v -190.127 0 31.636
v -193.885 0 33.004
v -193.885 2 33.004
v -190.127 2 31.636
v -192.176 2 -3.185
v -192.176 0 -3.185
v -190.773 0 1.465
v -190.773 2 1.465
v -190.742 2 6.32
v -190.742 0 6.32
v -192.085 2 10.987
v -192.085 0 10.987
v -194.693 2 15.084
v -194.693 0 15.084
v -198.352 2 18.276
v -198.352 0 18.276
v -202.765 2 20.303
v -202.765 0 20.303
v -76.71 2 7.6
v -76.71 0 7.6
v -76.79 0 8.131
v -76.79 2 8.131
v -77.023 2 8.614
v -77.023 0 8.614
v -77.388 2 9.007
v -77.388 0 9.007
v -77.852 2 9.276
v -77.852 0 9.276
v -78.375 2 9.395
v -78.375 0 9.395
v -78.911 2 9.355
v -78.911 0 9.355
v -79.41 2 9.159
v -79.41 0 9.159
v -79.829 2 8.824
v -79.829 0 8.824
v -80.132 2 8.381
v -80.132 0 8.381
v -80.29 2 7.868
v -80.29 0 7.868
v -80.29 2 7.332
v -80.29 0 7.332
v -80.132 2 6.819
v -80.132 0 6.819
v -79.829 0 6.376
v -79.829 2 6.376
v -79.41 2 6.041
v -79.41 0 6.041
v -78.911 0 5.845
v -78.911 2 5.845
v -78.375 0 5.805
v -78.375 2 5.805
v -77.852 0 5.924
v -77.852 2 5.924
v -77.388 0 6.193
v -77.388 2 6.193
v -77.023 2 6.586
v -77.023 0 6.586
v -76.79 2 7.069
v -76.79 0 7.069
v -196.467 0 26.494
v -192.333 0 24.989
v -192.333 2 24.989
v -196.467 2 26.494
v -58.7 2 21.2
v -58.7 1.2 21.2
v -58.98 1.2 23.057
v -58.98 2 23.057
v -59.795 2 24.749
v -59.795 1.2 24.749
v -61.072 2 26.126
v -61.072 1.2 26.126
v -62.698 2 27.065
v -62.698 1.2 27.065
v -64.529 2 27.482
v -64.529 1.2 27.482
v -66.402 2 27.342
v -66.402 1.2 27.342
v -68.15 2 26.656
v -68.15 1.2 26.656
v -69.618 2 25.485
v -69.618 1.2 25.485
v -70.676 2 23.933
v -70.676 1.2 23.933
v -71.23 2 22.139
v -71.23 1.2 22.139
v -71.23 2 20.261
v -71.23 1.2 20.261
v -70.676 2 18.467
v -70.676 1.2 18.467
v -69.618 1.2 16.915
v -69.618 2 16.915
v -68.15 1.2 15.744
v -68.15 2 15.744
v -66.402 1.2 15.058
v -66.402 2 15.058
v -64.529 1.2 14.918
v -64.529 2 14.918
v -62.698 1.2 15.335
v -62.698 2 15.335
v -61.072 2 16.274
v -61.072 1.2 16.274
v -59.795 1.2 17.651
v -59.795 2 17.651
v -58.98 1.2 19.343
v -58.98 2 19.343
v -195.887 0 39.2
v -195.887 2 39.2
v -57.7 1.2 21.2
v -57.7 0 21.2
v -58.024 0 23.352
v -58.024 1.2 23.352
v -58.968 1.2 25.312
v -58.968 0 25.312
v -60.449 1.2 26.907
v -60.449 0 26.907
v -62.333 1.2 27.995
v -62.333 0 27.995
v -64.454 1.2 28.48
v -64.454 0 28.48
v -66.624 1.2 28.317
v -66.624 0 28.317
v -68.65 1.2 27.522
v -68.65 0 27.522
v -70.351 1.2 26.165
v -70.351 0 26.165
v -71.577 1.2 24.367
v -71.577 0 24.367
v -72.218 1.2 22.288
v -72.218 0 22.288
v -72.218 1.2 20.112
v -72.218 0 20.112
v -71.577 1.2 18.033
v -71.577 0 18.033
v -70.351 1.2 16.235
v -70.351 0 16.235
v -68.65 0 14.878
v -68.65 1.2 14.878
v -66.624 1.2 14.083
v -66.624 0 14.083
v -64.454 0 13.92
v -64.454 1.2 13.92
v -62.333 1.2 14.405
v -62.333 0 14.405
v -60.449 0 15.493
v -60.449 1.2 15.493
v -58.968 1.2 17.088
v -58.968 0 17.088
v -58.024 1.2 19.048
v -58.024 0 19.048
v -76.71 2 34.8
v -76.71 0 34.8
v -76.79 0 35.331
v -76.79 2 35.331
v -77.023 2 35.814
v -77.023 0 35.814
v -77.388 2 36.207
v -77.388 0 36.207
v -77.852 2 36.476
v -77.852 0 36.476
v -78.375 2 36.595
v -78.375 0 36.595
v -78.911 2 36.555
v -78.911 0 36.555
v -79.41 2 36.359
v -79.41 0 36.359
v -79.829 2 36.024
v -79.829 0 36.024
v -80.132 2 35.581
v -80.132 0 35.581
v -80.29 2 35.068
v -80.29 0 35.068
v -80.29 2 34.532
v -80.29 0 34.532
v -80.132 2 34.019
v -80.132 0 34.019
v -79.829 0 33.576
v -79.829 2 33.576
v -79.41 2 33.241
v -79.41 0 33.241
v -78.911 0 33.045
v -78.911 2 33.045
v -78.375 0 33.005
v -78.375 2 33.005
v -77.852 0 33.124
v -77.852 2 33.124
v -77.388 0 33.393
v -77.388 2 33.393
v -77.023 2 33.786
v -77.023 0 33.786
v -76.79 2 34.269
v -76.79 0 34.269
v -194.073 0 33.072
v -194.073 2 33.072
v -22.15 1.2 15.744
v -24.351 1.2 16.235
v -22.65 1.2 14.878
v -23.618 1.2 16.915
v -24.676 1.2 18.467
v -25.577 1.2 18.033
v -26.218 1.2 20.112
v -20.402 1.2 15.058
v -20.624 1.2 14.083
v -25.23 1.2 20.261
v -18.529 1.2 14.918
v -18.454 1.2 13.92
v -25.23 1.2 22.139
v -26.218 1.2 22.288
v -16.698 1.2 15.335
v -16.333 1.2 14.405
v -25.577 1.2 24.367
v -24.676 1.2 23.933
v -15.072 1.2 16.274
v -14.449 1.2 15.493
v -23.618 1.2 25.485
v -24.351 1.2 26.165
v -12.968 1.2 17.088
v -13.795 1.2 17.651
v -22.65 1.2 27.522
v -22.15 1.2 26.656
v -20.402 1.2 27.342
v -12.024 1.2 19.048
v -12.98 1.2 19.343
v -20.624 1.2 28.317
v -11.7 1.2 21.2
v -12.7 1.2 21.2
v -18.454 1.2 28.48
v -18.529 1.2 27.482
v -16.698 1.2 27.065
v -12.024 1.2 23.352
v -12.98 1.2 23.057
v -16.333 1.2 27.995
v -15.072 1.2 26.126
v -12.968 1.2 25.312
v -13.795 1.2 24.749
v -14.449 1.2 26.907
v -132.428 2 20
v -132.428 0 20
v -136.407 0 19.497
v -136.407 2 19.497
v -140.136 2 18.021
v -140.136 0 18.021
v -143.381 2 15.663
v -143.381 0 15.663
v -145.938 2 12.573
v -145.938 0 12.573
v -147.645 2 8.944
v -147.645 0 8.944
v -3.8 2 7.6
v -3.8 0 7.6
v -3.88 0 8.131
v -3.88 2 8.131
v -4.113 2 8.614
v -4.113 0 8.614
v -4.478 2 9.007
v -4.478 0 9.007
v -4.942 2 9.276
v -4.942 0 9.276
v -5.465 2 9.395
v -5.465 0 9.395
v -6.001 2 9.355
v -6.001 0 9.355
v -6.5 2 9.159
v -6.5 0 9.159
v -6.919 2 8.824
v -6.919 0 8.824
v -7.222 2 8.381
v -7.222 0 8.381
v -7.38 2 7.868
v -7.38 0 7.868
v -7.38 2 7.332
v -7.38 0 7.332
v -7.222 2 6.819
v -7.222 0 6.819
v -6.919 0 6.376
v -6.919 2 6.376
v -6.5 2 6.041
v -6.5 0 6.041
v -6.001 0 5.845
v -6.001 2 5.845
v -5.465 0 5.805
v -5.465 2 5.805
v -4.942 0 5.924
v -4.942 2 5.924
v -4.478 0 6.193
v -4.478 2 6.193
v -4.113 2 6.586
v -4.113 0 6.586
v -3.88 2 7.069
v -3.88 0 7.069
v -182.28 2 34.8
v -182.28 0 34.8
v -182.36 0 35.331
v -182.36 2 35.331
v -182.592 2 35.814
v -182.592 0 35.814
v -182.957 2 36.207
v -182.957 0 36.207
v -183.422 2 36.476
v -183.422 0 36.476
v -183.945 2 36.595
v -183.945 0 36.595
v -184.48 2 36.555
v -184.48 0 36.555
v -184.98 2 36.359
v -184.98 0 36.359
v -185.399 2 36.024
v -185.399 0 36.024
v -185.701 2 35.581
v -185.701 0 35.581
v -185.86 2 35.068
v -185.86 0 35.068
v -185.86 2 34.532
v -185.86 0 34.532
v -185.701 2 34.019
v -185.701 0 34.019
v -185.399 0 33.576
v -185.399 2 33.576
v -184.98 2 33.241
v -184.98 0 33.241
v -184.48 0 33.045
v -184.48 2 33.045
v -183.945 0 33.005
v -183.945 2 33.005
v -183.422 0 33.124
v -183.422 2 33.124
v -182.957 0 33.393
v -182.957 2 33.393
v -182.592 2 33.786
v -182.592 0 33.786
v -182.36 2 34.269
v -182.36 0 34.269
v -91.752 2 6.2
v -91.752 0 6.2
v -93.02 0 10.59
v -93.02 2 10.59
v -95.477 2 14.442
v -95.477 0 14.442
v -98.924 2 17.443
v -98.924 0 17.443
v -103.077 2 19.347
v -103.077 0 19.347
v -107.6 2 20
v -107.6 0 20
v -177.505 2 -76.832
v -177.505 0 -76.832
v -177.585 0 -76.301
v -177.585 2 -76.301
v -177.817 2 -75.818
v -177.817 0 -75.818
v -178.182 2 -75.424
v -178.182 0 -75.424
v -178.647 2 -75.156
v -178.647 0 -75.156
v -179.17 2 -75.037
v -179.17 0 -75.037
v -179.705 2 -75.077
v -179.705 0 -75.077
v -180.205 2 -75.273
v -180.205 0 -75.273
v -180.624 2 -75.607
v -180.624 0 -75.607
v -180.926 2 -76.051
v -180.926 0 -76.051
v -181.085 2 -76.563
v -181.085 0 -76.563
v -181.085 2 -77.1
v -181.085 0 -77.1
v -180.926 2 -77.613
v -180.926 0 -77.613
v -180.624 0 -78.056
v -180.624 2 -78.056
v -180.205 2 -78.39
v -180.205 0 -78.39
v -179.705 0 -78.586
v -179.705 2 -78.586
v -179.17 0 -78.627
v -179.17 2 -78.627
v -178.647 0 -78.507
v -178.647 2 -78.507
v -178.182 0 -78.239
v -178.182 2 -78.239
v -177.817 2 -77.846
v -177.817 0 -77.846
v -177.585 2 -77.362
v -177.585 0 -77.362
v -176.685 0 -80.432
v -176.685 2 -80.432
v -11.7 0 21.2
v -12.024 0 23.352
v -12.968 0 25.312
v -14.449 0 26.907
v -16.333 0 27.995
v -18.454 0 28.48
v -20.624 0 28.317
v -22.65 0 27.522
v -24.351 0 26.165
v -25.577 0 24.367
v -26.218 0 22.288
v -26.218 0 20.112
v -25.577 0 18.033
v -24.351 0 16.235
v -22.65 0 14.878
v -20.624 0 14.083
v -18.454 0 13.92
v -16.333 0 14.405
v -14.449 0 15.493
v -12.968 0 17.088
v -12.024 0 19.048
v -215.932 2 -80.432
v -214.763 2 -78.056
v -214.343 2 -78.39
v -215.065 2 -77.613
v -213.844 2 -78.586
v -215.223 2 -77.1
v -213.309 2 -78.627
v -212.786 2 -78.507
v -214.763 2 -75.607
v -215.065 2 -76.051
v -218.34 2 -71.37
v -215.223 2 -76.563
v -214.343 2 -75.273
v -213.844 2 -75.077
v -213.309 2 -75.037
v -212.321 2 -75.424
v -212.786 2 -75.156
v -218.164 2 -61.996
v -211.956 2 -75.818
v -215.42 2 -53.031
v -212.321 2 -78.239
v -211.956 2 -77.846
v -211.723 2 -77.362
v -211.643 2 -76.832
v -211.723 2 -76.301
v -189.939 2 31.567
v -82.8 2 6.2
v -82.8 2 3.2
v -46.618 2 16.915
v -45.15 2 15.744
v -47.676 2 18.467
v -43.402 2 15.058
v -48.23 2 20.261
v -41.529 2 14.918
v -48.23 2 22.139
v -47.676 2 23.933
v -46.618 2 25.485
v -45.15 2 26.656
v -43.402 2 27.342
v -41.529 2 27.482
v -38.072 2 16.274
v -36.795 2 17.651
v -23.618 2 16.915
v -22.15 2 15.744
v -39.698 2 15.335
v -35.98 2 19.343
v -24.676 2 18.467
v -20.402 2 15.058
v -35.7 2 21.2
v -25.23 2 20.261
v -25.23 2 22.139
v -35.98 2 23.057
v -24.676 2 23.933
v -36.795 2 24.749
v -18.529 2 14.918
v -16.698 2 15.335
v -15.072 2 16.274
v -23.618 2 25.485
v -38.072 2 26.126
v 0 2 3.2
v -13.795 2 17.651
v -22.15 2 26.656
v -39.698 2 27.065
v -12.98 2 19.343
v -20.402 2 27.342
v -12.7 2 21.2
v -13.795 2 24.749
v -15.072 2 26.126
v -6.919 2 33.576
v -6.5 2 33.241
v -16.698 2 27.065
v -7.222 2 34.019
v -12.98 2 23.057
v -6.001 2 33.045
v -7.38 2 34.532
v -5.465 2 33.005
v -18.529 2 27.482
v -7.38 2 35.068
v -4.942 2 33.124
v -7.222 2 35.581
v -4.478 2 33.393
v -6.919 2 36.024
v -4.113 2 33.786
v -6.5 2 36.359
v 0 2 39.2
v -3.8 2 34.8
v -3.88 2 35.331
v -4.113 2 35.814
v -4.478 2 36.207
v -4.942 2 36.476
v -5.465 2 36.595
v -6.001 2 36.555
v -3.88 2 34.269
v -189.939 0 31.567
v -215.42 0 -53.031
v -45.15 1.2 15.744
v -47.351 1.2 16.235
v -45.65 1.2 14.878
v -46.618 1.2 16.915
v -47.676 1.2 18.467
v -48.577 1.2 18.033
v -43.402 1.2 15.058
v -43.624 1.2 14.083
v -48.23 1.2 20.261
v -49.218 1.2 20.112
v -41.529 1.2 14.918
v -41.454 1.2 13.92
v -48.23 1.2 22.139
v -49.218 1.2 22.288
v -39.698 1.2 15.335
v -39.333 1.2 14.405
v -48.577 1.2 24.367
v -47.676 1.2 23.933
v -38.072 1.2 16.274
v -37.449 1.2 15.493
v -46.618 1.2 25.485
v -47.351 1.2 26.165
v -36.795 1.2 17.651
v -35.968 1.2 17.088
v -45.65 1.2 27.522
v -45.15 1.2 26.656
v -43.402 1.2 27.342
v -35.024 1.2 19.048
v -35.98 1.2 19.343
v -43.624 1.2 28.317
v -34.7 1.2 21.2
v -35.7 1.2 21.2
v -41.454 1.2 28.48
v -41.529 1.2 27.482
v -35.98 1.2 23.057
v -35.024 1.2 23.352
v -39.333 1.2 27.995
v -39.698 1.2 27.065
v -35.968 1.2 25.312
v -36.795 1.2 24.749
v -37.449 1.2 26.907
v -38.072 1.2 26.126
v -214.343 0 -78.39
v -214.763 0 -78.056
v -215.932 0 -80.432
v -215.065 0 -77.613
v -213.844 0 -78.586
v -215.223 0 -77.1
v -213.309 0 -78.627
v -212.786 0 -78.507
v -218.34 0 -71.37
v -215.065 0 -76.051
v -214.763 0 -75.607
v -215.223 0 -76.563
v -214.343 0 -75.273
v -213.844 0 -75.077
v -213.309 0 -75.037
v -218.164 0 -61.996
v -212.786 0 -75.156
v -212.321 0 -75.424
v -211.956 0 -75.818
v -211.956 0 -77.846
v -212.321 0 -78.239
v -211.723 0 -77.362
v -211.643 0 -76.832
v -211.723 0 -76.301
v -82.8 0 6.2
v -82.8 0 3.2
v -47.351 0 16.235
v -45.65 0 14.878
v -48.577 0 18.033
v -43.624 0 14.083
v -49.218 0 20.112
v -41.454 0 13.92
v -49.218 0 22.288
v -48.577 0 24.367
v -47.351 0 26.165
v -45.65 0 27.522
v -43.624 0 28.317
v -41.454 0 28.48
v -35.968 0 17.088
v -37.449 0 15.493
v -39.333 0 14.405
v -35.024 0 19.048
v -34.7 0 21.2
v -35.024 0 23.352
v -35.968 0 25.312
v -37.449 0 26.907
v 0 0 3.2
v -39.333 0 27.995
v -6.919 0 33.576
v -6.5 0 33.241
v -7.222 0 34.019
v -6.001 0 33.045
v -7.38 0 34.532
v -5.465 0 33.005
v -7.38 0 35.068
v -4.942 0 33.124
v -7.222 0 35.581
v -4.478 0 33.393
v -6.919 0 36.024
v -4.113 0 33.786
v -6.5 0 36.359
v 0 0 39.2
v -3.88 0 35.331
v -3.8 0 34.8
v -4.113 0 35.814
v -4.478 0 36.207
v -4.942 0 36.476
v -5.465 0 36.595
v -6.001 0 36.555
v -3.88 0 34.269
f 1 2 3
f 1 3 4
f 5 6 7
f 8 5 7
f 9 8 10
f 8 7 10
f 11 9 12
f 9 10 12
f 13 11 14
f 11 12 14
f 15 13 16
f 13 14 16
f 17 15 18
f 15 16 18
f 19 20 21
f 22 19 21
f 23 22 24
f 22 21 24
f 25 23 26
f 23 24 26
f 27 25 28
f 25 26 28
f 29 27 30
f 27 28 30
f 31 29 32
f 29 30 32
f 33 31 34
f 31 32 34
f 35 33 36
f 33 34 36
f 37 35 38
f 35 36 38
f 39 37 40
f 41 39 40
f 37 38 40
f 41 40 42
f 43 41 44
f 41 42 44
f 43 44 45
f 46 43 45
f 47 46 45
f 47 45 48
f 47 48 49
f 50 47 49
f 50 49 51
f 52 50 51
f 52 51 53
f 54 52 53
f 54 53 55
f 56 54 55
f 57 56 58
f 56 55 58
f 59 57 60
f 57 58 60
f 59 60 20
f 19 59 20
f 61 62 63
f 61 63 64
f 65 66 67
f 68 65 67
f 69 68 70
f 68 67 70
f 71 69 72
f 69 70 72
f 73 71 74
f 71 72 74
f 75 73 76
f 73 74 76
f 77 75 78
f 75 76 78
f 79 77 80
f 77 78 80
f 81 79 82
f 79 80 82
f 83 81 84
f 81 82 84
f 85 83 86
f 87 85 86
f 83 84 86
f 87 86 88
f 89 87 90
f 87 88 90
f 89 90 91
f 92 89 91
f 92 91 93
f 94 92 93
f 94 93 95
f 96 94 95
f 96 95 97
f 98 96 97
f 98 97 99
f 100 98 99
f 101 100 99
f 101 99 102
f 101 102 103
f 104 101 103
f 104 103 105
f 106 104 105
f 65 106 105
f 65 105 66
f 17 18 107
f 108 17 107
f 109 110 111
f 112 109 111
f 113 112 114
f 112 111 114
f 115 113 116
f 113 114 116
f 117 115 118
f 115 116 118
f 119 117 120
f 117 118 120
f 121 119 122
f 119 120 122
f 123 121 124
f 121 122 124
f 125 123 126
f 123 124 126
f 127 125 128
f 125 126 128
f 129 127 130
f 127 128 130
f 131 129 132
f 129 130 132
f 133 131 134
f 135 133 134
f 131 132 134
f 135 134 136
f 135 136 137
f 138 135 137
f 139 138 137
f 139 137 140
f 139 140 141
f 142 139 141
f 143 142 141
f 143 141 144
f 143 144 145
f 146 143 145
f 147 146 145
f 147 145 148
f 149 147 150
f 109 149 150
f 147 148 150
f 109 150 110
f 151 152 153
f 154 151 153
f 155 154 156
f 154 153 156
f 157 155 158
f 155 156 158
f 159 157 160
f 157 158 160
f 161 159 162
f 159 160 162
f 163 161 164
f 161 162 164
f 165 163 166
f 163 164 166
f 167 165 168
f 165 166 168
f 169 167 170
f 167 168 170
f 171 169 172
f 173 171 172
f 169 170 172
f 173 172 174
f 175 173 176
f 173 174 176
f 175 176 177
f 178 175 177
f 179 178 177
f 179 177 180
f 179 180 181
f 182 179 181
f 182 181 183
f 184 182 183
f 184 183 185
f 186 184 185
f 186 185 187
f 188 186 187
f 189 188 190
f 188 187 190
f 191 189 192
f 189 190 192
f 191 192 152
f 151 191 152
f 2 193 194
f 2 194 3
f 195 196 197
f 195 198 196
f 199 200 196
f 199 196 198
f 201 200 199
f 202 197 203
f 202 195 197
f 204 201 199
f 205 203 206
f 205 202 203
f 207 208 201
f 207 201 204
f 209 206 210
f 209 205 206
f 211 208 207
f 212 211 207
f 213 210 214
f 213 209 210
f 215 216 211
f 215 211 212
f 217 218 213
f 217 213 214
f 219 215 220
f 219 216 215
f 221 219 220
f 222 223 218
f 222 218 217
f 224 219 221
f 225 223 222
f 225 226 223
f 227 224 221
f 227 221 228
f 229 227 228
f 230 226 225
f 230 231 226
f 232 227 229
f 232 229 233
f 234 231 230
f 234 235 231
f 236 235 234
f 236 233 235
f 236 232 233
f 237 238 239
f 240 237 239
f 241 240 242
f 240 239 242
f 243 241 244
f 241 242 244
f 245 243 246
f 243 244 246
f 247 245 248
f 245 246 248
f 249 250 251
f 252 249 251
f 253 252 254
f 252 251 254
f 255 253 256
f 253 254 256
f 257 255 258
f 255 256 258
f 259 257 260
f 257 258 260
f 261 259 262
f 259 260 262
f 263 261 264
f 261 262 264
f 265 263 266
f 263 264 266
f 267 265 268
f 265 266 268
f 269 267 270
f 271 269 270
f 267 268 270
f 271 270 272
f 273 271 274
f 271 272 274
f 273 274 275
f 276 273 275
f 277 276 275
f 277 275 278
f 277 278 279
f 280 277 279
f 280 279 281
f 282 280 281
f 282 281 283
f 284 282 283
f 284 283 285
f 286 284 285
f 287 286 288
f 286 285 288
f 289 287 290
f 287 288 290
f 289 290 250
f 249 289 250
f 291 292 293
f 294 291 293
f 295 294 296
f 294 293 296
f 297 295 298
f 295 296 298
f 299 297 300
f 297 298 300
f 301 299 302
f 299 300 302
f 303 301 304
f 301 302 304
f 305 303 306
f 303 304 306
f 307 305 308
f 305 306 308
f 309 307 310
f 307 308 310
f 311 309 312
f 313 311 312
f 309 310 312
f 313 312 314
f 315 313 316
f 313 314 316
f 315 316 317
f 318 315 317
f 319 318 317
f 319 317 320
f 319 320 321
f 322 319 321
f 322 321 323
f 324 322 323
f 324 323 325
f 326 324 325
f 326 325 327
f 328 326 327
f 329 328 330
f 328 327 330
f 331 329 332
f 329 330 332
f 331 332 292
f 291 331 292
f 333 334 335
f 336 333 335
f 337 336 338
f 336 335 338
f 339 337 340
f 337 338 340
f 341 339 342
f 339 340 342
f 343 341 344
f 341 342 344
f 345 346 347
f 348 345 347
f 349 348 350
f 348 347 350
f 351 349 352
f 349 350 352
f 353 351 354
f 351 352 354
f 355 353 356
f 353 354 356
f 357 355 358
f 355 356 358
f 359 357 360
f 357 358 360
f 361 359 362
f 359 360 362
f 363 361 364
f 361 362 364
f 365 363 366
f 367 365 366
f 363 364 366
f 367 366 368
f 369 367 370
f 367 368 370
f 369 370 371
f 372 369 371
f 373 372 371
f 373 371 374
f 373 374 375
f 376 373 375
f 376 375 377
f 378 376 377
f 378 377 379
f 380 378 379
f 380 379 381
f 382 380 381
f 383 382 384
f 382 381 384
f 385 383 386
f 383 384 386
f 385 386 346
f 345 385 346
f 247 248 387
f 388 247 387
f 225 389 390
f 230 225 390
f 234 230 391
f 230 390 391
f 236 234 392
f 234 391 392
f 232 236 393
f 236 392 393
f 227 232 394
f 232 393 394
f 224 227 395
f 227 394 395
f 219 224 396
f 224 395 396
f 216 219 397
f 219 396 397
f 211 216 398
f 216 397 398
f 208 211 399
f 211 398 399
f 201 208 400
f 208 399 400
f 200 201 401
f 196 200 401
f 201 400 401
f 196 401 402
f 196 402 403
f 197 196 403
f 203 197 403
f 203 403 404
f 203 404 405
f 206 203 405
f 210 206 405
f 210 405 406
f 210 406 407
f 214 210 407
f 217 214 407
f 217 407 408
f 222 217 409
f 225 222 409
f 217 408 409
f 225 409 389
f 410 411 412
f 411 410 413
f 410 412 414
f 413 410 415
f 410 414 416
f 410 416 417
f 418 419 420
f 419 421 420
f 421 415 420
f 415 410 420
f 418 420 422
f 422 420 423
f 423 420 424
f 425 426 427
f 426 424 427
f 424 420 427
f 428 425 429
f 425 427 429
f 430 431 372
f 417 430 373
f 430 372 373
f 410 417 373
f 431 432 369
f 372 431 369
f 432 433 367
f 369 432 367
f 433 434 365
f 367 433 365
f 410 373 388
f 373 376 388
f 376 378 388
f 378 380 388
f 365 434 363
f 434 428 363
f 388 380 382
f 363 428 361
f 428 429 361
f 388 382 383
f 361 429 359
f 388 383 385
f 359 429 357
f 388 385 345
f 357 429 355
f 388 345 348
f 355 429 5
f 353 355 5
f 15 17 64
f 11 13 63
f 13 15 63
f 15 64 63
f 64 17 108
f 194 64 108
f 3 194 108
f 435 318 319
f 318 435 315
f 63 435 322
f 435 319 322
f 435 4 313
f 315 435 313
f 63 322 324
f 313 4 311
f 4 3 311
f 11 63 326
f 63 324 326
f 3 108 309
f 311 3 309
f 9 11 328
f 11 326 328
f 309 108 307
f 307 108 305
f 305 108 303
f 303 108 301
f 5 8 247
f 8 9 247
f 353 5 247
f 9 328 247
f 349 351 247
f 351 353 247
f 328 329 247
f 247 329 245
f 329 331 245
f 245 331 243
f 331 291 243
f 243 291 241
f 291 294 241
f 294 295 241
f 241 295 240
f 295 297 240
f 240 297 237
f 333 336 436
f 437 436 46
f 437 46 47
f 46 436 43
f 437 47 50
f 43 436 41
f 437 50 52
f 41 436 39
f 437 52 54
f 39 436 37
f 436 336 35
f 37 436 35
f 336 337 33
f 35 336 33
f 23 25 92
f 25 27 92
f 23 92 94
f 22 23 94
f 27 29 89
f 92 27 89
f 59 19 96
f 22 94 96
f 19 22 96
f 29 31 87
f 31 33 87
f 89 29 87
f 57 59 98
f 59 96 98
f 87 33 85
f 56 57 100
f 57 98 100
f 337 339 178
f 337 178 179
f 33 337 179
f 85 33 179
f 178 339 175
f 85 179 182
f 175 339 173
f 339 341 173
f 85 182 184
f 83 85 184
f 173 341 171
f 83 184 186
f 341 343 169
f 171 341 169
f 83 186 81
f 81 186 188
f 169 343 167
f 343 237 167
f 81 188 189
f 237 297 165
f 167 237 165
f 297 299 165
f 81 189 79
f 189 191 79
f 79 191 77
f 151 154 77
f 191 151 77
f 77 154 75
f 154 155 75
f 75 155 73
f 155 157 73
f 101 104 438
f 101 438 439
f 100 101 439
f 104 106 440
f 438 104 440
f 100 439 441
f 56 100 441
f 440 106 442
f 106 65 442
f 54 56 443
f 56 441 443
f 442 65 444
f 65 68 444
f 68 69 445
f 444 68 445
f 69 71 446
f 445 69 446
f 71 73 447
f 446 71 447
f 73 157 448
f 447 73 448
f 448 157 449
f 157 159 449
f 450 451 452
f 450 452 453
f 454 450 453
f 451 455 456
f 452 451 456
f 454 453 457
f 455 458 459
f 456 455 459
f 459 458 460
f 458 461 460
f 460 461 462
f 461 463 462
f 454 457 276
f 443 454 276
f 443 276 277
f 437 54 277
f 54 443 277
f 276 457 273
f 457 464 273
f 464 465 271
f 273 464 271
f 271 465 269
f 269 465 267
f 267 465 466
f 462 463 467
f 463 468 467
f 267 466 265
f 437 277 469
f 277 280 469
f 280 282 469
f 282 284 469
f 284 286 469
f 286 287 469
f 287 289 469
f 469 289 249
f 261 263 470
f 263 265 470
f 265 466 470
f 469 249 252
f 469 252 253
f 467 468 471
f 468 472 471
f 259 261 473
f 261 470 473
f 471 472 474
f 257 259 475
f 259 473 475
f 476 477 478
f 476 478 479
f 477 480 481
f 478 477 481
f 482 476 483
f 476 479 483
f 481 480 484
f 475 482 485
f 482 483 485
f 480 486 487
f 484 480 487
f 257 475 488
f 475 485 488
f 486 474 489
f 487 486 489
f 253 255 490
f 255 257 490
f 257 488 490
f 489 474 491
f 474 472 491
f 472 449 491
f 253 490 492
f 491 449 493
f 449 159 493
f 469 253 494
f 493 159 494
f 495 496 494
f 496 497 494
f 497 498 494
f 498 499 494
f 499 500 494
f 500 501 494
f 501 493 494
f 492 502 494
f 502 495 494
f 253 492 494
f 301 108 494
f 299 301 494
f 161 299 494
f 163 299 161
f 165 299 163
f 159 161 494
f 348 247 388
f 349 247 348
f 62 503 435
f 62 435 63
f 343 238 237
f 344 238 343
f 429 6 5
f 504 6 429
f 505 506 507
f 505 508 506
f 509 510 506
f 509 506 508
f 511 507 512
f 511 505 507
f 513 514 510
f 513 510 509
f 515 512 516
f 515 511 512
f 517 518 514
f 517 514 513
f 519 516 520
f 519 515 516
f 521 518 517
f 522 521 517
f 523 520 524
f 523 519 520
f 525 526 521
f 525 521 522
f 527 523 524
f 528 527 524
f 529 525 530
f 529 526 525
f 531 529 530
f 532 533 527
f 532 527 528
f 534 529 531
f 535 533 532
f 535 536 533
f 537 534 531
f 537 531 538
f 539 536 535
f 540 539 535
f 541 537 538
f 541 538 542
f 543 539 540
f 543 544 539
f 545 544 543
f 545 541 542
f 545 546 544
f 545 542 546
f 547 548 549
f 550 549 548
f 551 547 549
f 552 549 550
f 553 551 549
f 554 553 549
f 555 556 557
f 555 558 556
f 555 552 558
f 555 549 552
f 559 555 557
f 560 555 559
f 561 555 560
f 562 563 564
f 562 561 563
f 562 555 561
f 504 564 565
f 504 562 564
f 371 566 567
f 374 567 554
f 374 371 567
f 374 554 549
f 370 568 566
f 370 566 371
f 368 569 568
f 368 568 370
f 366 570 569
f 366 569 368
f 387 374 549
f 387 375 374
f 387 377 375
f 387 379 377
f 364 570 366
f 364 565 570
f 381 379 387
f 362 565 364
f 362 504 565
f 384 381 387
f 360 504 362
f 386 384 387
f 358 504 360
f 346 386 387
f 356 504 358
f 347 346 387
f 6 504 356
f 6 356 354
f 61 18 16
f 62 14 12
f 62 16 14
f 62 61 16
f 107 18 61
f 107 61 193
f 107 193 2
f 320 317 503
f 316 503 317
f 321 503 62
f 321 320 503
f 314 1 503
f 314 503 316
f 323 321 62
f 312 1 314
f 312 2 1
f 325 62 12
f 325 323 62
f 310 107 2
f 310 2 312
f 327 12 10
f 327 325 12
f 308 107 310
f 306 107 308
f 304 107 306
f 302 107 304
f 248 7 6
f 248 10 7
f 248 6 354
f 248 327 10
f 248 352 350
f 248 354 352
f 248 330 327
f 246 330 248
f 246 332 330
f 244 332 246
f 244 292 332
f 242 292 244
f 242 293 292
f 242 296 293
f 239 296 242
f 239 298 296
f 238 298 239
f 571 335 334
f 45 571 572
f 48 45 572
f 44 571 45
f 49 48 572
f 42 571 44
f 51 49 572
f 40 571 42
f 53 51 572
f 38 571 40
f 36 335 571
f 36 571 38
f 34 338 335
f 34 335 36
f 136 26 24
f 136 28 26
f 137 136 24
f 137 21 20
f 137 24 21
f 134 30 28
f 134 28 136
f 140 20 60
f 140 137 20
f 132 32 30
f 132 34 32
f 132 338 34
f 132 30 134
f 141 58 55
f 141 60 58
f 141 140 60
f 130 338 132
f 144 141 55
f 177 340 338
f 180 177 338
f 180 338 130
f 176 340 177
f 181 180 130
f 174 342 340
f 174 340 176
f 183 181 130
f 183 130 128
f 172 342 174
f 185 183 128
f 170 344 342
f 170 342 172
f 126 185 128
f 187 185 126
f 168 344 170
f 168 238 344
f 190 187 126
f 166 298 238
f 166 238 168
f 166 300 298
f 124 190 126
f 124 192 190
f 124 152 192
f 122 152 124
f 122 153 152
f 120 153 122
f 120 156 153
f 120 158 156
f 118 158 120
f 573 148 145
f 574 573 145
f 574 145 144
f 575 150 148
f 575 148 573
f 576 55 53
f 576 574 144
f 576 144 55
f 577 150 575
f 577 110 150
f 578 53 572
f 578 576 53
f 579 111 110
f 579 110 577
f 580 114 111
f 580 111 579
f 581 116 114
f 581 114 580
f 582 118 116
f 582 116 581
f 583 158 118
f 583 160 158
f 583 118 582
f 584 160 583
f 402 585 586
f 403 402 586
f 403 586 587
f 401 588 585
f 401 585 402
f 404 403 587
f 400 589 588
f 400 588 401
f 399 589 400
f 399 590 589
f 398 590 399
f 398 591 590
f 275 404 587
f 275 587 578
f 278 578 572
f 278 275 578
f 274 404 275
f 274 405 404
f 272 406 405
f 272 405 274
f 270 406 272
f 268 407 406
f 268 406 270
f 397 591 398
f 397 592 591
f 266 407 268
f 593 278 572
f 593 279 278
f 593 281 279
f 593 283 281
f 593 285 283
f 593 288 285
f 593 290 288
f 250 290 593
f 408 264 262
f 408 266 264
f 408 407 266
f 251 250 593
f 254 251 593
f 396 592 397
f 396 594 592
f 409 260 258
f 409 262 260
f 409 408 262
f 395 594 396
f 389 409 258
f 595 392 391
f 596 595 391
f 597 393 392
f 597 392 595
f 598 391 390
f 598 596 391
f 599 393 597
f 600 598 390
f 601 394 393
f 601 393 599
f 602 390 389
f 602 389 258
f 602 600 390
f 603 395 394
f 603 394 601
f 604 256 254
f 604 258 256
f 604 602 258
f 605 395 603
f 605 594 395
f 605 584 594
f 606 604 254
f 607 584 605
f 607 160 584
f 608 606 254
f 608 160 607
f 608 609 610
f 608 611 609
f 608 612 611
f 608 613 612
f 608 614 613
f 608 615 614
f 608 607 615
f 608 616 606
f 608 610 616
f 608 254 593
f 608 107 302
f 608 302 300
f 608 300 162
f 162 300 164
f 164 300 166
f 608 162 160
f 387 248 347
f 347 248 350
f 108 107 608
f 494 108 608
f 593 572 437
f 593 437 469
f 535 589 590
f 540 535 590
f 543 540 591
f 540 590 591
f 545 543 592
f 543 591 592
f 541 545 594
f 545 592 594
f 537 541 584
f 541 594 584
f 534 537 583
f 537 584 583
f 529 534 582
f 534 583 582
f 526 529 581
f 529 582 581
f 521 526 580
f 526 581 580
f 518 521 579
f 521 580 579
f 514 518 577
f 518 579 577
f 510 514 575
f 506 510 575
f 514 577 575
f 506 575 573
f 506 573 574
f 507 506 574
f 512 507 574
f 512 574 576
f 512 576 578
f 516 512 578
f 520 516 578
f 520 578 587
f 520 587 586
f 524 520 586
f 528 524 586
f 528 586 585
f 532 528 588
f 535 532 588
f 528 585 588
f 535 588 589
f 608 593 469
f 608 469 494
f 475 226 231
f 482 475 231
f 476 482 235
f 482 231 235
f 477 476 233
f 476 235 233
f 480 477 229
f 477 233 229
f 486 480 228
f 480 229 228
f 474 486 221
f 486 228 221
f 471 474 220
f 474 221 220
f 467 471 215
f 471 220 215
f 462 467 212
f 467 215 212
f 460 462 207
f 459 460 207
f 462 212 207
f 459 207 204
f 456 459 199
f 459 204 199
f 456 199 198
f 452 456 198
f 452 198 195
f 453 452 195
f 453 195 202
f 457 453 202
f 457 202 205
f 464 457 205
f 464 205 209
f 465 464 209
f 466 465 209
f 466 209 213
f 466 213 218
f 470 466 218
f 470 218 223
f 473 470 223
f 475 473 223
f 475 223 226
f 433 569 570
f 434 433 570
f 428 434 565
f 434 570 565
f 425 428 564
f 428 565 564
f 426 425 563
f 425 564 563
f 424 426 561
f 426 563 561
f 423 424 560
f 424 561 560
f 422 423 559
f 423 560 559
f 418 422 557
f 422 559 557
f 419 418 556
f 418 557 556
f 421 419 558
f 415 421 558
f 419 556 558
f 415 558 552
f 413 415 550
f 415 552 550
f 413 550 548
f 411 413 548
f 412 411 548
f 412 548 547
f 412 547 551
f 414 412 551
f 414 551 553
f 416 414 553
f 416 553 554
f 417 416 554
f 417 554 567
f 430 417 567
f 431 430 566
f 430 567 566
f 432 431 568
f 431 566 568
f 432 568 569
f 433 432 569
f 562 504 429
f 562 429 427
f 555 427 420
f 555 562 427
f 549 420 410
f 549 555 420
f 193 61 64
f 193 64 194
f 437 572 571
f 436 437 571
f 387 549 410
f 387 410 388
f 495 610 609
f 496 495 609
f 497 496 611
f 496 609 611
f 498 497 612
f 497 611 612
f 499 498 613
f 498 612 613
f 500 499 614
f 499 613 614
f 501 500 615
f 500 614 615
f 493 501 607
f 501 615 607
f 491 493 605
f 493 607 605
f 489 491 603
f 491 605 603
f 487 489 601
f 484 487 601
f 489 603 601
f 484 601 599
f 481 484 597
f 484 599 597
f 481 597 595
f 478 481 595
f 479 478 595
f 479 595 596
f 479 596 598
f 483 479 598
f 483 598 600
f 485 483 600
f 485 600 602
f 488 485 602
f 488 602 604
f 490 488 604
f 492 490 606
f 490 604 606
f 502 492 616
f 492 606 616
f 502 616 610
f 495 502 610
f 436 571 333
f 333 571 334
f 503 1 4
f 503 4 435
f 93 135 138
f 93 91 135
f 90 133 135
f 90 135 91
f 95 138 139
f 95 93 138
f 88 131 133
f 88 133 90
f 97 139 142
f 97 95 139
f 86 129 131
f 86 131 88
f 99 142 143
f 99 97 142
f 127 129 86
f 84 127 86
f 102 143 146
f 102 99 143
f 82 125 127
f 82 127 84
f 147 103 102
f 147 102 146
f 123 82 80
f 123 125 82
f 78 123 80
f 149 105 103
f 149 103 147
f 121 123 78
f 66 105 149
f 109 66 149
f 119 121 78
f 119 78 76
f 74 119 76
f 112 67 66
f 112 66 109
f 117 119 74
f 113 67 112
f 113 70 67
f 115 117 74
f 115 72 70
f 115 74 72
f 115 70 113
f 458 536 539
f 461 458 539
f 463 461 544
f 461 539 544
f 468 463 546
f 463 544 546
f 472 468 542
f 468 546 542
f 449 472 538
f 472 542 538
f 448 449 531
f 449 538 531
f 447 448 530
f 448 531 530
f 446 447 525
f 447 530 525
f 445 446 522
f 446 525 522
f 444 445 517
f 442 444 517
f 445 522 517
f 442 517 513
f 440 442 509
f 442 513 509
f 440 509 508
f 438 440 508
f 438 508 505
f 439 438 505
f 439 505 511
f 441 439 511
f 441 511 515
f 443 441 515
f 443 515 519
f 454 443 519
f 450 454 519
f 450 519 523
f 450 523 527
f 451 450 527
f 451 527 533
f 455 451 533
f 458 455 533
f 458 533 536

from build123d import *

# Parameters (mm, degrees)
SKETCH076_R      = 7.3
EXTRUDE077_DEPTH = 1.2
SKETCH074_R      = 1.8
SKETCH074_R_2    = 6.3
EXTRUDE076_DEPTH = 2


with BuildPart() as extrude_lato_sx_pistola_scavi_pulsanti:
    # Sketch076 → Extrude077 (new body)
    with BuildSketch(Plane.XZ):
        with Locations((-65, 21.2)):
            Circle(SKETCH076_R)
        with Locations((-42, 21.2)):
            Circle(SKETCH076_R)
        with Locations((-19, 21.2)):
            Circle(SKETCH076_R)
    extrude(amount=-EXTRUDE077_DEPTH)


with BuildPart() as cut044:
    # Sketch074 → Extrude076 (new body)
    with BuildSketch(Plane.XZ):
        with BuildLine():
            Line((-82.8, 3.2), (0, 3.2))
            Line((0, 3.2), (0, 39.2))
            Line((-195.886839, 39.2), (0, 39.2))
            Line((-202.764796, 20.302968), (-195.886839, 39.2))
            ThreePointArc((-192.175575, -3.18451), (-192.085048, 10.987093), (-202.764796, 20.302968))
            Line((-192.175575, -3.18451), (-215.419579, -53.031439))
            ThreePointArc((-215.419579, -53.031439), (-218.578907, -66.677212), (-215.93199, -80.431568))
            Line((-215.93199, -80.431568), (-176.68528, -80.431568))
            Line((-147.645309, 8.944272), (-176.68528, -80.431568))
            ThreePointArc((-132.428405, 20), (-141.832969, 16.944272), (-147.645309, 8.944272))
            Line((-132.428405, 20), (-107.6, 20))
            ThreePointArc((-91.751972, 6.2), (-97.09286, 16.066483), (-107.6, 20))
            Line((-82.8, 6.2), (-91.751972, 6.2))
            Line((-82.8, 3.2), (-82.8, 6.2))
        make_face()
        with Locations((-213.443268, -76.831568)):
            Circle(SKETCH074_R, mode=Mode.SUBTRACT)
        with Locations((-179.304663, -76.831568)):
            Circle(SKETCH074_R, mode=Mode.SUBTRACT)
        with Locations((-184.079668, 34.8)):
            Circle(SKETCH074_R, mode=Mode.SUBTRACT)
        with Locations((-78.51, 34.8)):
            Circle(SKETCH074_R, mode=Mode.SUBTRACT)
        with Locations((-78.51, 7.6)):
            Circle(SKETCH074_R, mode=Mode.SUBTRACT)
        with Locations((-5.6, 34.8)):
            Circle(SKETCH074_R, mode=Mode.SUBTRACT)
        with Locations((-5.6, 7.6)):
            Circle(SKETCH074_R, mode=Mode.SUBTRACT)
        with Locations((-19, 21.2)):
            Circle(SKETCH074_R_2, mode=Mode.SUBTRACT)
        with Locations((-42, 21.2)):
            Circle(SKETCH074_R_2, mode=Mode.SUBTRACT)
        with Locations((-65, 21.2)):
            Circle(SKETCH074_R_2, mode=Mode.SUBTRACT)
        Polygon((-189.938695, 31.567195), (-192.332836, 24.989347), (-196.467483, 26.494236), (-194.073342, 33.072084), (-193.885404, 33.00368), (-190.126633, 31.635599), align=None, mode=Mode.SUBTRACT)
    extrude(amount=-EXTRUDE076_DEPTH)

    # Cut044: cut Extrude lato sx pistola - scavi pulsanti
    add(extrude_lato_sx_pistola_scavi_pulsanti.part, mode=Mode.SUBTRACT)


solid = cut044.part
